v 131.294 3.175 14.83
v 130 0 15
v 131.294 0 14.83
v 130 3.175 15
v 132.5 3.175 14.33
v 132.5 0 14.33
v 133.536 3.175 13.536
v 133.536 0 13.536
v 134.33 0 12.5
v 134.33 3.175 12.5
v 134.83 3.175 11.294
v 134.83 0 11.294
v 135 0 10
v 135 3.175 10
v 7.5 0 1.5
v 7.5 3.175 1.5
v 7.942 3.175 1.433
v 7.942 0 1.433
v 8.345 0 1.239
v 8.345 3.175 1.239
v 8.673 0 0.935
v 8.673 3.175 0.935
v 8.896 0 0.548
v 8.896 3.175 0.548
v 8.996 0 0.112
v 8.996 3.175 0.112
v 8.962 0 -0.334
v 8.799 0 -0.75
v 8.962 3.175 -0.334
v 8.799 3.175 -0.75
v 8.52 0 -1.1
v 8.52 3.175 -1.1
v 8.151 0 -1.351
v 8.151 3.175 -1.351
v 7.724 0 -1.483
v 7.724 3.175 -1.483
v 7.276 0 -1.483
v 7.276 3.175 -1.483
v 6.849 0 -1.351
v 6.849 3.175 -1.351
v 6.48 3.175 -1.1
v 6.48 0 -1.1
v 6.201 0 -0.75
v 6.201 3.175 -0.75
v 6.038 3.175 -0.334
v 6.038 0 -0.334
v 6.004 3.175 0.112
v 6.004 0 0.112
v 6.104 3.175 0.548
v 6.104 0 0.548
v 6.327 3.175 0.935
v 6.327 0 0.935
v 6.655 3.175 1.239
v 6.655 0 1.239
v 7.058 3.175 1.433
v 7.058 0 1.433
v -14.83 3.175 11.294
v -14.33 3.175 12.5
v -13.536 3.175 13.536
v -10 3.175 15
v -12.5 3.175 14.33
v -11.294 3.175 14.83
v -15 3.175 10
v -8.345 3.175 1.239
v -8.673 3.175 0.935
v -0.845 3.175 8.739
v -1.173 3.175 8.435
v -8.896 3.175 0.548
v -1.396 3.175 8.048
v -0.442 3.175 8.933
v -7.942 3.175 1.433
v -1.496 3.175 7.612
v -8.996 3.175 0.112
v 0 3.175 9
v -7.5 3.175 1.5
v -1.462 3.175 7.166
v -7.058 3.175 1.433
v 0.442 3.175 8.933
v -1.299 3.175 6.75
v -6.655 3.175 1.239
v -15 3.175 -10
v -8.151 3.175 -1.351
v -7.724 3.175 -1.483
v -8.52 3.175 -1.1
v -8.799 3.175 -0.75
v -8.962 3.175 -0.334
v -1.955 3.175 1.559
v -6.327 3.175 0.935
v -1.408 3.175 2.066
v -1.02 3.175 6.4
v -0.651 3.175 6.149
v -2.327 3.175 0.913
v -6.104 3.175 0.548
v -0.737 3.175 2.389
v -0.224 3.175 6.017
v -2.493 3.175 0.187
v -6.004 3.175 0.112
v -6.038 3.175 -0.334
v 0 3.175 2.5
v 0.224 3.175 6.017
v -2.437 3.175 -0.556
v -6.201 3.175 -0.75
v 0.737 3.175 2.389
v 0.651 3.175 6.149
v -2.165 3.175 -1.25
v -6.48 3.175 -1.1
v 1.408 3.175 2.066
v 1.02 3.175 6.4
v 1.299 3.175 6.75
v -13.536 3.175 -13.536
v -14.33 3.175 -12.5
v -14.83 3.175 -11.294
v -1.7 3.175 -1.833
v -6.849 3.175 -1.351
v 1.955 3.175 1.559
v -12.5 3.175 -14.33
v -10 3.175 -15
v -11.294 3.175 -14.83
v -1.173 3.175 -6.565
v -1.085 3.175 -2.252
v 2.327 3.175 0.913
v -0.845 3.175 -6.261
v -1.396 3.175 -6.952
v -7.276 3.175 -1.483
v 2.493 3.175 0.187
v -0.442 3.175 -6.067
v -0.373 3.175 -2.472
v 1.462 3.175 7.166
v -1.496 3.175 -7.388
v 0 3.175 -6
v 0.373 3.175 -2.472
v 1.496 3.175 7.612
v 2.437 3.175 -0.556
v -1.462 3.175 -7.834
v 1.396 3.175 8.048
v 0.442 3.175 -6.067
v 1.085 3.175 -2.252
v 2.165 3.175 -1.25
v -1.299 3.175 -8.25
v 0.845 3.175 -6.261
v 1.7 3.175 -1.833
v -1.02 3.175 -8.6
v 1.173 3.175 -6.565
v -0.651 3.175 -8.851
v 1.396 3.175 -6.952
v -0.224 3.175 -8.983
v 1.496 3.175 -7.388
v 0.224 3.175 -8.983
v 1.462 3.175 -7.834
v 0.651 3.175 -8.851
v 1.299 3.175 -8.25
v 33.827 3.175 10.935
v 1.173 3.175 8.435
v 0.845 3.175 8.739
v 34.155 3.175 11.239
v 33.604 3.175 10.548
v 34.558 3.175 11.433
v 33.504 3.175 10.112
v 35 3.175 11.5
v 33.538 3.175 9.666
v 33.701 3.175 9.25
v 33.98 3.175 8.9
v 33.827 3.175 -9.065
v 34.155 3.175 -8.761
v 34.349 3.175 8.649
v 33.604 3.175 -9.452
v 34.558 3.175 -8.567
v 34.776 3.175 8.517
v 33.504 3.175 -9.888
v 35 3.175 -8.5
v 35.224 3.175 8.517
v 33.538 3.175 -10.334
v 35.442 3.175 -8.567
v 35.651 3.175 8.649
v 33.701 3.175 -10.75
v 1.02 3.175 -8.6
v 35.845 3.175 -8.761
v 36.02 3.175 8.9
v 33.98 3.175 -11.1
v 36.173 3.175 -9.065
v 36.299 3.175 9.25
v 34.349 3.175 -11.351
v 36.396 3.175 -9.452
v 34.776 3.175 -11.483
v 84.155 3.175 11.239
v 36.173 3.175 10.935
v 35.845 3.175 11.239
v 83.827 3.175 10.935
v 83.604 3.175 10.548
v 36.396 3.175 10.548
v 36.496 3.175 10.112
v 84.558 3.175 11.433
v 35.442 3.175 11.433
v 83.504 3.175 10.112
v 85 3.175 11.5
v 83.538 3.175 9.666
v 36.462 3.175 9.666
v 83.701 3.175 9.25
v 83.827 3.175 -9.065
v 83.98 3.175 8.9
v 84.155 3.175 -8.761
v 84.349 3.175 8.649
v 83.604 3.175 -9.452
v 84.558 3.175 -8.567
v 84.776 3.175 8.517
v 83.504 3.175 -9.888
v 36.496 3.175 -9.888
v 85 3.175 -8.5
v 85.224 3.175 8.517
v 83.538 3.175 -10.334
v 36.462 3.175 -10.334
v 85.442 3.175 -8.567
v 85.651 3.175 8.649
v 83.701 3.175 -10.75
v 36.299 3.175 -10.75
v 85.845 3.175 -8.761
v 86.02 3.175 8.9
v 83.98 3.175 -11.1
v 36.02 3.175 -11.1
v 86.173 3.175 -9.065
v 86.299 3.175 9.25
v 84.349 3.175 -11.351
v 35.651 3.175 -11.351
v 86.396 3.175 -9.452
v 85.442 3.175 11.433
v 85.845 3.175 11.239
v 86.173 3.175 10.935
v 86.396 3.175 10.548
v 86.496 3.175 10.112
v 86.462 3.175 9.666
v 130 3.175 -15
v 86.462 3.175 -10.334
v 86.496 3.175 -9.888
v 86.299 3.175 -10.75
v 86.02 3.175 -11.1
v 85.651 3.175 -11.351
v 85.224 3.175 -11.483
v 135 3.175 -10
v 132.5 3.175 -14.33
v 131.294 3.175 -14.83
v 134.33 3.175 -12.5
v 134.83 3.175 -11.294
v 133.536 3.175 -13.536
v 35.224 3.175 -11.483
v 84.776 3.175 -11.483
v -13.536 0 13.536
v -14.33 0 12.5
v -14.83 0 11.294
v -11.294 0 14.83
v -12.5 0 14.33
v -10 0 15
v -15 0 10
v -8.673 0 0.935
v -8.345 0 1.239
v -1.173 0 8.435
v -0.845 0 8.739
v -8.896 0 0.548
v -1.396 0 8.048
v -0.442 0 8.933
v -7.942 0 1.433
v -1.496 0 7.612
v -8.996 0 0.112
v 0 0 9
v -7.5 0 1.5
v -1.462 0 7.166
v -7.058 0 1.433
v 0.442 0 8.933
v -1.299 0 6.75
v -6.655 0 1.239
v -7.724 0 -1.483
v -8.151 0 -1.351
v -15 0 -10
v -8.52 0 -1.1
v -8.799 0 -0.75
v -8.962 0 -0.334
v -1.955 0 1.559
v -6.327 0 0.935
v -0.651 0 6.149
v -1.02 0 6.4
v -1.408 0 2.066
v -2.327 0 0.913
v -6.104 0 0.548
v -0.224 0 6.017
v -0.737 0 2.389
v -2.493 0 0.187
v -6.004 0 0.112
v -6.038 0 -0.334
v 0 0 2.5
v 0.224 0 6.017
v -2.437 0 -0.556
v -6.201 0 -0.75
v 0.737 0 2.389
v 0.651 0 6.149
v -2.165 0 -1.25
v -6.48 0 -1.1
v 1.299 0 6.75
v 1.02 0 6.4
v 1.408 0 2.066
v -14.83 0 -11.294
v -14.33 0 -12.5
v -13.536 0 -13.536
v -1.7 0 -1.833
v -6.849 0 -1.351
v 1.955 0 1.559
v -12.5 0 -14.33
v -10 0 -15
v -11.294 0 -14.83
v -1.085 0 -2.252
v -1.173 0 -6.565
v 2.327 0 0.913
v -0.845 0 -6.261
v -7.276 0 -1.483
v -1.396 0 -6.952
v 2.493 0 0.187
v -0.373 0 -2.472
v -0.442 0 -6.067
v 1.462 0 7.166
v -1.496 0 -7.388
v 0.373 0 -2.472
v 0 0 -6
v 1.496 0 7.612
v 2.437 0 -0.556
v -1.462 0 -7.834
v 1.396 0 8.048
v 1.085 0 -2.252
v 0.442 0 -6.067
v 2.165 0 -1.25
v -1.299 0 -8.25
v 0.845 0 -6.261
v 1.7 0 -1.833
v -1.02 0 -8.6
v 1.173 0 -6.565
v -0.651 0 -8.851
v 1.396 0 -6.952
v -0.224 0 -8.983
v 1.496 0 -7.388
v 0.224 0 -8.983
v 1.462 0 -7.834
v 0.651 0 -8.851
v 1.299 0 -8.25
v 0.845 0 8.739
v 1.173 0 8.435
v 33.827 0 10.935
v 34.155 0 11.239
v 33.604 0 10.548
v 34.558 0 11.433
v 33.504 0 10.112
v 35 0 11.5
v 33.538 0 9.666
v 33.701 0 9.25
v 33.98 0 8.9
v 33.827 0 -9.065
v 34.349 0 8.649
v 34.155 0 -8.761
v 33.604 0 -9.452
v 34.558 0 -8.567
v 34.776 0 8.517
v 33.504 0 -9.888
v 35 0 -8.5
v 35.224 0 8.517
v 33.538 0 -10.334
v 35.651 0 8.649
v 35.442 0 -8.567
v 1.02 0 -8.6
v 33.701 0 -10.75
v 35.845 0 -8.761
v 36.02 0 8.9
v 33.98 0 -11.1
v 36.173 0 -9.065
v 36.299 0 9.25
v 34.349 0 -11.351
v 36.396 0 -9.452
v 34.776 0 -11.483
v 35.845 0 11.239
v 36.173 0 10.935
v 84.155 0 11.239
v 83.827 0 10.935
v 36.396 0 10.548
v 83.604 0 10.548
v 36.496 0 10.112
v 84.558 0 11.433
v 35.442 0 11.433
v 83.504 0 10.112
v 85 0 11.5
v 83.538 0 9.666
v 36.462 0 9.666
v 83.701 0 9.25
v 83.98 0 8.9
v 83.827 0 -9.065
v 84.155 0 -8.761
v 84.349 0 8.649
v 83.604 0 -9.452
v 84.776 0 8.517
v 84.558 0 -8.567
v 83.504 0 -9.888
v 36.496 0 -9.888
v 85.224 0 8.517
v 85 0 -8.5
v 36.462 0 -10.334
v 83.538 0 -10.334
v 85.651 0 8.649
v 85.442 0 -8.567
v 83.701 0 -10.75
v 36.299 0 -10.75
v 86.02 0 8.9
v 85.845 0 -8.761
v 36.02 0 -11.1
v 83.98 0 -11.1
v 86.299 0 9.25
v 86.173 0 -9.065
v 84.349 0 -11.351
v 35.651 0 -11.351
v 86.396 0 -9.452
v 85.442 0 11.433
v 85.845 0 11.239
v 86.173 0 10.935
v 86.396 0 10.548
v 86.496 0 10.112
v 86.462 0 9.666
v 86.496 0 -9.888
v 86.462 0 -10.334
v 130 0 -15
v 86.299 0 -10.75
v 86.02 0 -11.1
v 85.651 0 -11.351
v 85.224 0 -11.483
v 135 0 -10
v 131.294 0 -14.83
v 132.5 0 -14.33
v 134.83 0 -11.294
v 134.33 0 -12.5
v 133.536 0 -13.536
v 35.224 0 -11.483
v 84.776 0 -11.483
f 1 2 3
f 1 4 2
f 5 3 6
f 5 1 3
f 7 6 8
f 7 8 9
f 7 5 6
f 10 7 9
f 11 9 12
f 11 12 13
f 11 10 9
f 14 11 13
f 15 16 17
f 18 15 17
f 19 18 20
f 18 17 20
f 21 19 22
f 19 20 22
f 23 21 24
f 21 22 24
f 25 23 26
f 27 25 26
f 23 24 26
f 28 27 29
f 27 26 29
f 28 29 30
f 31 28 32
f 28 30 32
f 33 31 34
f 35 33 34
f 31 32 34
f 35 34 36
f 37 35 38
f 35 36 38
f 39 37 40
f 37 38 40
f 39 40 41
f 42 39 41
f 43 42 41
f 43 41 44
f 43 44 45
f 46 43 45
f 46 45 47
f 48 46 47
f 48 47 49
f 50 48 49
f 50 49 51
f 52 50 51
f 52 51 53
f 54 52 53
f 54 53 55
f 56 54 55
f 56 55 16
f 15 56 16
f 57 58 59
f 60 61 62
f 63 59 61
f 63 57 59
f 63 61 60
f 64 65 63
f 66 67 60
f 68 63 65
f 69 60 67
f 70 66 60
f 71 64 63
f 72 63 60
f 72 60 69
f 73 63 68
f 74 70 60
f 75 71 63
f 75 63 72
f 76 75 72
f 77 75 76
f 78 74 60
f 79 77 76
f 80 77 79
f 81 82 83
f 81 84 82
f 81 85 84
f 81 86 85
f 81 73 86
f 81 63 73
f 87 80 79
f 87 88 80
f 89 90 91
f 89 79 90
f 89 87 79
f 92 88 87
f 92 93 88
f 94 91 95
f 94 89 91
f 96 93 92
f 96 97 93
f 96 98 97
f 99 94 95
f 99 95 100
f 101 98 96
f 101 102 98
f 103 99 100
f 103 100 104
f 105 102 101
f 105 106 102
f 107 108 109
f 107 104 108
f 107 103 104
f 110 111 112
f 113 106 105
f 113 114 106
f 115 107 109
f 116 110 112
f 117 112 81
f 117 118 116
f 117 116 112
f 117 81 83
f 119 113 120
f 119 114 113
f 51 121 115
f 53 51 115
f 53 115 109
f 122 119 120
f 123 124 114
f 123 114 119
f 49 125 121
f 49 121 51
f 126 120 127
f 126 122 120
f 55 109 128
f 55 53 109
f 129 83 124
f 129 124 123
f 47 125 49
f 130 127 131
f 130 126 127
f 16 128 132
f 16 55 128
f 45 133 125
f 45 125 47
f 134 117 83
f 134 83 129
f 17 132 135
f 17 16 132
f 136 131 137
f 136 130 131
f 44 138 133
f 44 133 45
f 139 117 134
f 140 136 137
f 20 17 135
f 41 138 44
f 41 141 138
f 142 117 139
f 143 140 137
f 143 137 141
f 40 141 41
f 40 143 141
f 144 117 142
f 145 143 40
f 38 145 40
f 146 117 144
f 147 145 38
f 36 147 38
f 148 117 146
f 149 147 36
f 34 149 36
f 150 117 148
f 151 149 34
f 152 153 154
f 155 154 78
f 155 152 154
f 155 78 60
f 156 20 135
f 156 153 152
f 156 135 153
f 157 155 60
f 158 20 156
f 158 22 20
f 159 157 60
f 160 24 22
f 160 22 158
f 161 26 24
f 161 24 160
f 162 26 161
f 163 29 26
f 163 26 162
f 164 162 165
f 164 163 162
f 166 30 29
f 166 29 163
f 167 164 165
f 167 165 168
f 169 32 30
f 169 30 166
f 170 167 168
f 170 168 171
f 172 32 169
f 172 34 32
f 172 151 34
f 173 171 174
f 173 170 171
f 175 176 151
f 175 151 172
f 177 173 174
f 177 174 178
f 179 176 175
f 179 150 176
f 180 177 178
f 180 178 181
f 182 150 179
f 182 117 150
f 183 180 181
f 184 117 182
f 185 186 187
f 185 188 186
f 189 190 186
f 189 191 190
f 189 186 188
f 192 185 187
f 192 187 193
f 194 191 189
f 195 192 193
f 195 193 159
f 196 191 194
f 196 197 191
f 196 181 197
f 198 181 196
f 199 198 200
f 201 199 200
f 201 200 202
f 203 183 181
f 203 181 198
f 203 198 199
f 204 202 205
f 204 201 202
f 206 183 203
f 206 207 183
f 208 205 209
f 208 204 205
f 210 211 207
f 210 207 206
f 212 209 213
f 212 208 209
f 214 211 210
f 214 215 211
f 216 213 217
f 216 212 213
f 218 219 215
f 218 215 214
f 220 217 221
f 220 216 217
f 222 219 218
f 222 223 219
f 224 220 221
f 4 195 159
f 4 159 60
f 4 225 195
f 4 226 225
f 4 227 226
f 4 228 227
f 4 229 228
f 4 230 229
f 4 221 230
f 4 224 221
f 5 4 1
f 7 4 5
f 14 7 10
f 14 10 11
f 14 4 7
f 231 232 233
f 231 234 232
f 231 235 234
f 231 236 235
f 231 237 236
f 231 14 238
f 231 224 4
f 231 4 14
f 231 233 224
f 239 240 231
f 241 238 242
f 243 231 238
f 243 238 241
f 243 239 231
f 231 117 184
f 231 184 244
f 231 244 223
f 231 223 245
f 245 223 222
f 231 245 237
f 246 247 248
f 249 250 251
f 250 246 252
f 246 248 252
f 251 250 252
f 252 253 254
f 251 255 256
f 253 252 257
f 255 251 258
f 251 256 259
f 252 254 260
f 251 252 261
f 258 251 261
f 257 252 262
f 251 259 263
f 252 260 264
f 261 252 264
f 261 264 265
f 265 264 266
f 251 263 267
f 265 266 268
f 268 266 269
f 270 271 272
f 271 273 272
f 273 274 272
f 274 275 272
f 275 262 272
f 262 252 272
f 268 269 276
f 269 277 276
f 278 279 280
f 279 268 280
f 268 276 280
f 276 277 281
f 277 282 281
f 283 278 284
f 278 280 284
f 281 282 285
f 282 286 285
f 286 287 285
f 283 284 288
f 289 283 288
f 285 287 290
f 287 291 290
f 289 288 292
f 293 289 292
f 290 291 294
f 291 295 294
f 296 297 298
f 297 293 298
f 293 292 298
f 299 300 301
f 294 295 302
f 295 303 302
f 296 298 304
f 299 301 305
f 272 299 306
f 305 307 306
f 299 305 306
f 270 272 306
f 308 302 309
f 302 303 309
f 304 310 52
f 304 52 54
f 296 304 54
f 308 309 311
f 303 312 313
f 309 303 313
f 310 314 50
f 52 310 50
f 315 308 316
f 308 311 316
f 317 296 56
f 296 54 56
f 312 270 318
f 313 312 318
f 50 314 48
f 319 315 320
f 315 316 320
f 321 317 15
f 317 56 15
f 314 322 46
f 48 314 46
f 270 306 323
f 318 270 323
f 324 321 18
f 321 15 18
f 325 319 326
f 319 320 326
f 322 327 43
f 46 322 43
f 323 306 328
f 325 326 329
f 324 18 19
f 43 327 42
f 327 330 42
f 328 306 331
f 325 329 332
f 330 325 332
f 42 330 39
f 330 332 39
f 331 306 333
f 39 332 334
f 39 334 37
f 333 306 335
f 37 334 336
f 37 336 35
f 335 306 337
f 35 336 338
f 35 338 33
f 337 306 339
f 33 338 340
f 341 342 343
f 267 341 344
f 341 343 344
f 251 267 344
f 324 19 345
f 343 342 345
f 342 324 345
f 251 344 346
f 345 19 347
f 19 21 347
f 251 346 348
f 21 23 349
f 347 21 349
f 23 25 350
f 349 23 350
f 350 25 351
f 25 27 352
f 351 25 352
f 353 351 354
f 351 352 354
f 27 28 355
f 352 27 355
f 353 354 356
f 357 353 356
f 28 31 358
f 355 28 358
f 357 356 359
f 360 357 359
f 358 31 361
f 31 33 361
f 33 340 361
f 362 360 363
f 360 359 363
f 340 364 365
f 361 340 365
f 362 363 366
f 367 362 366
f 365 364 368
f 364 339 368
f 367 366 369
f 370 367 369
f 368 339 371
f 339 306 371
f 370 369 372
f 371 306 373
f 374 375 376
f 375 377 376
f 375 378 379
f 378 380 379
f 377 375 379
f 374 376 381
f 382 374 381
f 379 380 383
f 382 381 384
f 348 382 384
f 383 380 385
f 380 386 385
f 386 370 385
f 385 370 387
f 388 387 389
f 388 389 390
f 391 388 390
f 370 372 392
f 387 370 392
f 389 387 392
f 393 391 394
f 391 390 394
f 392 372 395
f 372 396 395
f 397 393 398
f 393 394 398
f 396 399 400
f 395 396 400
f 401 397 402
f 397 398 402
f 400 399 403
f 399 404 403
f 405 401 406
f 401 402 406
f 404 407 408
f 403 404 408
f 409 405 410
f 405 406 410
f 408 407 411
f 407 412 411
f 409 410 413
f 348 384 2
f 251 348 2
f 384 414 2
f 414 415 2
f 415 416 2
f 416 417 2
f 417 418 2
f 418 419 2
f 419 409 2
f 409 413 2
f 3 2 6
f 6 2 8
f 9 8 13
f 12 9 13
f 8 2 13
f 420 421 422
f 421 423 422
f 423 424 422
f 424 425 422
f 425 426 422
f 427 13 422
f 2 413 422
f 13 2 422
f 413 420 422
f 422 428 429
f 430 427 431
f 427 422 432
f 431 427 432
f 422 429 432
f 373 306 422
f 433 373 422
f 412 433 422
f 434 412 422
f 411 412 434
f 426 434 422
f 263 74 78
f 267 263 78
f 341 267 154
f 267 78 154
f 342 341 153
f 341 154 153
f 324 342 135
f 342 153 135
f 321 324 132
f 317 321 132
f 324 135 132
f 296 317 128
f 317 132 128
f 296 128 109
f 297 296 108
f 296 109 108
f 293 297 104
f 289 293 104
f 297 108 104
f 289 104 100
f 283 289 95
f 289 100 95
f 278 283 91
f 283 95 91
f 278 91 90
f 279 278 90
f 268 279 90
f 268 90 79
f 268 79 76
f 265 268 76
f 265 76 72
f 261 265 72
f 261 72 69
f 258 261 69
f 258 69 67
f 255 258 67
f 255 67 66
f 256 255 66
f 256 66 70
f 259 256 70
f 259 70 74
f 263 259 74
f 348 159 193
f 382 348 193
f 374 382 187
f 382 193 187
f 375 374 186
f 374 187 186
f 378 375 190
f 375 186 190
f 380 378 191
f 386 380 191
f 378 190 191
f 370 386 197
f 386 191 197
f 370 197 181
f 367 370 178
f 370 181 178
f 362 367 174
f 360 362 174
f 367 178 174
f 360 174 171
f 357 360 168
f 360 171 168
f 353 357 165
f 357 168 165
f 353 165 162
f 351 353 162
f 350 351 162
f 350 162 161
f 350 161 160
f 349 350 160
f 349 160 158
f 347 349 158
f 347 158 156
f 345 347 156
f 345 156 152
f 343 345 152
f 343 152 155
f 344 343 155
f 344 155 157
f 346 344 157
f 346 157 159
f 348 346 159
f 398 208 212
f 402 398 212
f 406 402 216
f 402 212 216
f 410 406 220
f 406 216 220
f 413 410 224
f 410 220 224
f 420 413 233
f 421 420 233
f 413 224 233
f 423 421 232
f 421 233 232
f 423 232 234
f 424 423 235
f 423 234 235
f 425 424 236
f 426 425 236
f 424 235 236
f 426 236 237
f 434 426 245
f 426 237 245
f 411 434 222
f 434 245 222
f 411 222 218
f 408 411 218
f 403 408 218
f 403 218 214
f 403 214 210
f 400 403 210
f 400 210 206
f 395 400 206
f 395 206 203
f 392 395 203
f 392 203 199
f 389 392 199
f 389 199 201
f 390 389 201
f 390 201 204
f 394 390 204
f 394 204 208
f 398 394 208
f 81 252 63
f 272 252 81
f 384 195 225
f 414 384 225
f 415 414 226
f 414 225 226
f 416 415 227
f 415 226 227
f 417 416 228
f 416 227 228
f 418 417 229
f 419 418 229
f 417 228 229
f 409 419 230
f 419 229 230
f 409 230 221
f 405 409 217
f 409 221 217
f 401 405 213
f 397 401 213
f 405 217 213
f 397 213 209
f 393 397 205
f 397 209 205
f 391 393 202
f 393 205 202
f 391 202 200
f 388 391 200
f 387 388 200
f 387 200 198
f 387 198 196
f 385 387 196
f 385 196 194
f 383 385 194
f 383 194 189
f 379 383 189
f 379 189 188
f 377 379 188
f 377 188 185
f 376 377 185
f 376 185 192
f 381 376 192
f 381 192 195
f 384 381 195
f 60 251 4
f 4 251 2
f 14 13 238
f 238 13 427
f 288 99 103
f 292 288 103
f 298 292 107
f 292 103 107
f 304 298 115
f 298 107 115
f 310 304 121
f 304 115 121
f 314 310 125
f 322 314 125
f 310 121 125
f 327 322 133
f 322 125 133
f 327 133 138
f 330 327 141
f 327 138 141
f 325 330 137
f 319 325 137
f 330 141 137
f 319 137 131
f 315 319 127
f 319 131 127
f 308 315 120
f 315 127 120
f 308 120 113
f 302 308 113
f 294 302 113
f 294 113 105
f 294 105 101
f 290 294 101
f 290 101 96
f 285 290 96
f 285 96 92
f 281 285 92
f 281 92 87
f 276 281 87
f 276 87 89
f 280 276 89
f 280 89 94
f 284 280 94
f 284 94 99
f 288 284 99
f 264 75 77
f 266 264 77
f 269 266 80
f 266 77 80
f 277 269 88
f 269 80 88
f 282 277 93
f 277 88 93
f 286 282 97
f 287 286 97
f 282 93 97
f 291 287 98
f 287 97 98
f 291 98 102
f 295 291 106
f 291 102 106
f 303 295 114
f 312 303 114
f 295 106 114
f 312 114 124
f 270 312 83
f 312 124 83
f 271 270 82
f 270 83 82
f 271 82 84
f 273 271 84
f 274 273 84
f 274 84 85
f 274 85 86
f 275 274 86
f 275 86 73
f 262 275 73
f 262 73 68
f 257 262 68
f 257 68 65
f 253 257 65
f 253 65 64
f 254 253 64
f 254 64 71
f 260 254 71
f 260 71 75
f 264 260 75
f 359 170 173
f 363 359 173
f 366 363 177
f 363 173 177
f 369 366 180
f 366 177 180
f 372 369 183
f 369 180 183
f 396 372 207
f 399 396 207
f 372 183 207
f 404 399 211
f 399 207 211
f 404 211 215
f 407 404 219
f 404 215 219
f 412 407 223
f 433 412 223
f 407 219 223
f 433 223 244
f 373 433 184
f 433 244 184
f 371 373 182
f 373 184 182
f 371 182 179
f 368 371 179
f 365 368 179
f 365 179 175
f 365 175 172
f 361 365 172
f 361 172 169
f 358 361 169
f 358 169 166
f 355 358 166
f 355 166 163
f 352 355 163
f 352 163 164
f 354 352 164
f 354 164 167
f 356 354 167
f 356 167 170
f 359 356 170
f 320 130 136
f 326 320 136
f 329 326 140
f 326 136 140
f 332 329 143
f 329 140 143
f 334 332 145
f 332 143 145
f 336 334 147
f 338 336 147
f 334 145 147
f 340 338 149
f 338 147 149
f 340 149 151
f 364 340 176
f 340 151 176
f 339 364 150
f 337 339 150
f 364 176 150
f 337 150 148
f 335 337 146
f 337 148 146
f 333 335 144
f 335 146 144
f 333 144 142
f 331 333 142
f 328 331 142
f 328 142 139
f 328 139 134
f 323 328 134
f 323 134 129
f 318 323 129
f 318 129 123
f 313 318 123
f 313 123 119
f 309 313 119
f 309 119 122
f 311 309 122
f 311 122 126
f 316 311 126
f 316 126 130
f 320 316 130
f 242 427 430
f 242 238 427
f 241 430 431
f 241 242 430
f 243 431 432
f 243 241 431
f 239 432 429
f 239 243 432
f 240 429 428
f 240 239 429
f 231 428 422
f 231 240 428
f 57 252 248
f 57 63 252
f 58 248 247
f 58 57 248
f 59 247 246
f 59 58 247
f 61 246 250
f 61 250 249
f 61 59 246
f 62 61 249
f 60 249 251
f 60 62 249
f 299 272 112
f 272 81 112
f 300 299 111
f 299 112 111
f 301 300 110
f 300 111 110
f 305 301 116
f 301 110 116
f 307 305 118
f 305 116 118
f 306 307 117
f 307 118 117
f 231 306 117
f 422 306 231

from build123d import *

# Parameters (mm, degrees)
SKETCH1_W           = 150
SKETCH1_H           = 30
BOSS_EXTRUDE1_DEPTH = 3.175
FILLET1_R           = 5
SKETCH2_R           = 2.5
CUT_EXTRUDE1_DEPTH  = 136.867879298
SKETCH3_R           = 1.5
CUT_EXTRUDE3_DEPTH  = 136.867879298
SKETCH4_R           = 1.5
CUT_EXTRUDE4_DEPTH  = 10


with BuildPart() as part:
    # Sketch1 → Boss-Extrude1 (new body)
    with BuildSketch(Plane(origin=(0, 0, 0), x_dir=(1, 0, 0), z_dir=(0, 1, 0))):
        with Locations((60, 0)):
            Rectangle(SKETCH1_W, SKETCH1_H)
    extrude(amount=BOSS_EXTRUDE1_DEPTH)

    # Fillet1
    fillet1_edges = [part.edges().sort_by_distance(p)[0] for p in [
        (-15, 1.5875, -15),
        (135, 1.5875, -15),
        (135, 1.5875, 15),
        (-15, 1.5875, 15),
    ]]
    fillet(fillet1_edges, radius=FILLET1_R)

    # Sketch2 → Cut-Extrude1 (cut, through all)
    with BuildSketch(Plane(origin=(0, 3.175, 0), x_dir=(1, 0, 0), z_dir=(0, 1, 0))):
        with Locations(Location((0, 0, 0), (0, 0, 270))):
            Circle(SKETCH2_R)
    extrude(amount=-CUT_EXTRUDE1_DEPTH, mode=Mode.SUBTRACT)

    # Sketch3 → Cut-Extrude3 (cut, through all)
    with BuildSketch(Plane(origin=(0, 3.175, 0), x_dir=(1, 0, 0), z_dir=(0, 1, 0))):
        with Locations(Location((7.5, 0, 0), (0, 0, 270))):
            Circle(SKETCH3_R)
        with Locations(Location((0, -7.5, 0), (0, 0, 270))):
            Circle(SKETCH3_R)
        with Locations(Location((-7.5, 0, 0), (0, 0, 270))):
            Circle(SKETCH3_R)
        with Locations(Location((0, 7.5, 0), (0, 0, 270))):
            Circle(SKETCH3_R)
    extrude(amount=-CUT_EXTRUDE3_DEPTH, mode=Mode.SUBTRACT)

    # Sketch4 → Cut-Extrude4 (cut)
    with BuildSketch(Plane(origin=(0, 3.175, 0), x_dir=(1, 0, 0), z_dir=(0, 1, 0))):
        with Locations(Location((35, -10, 0), (0, 0, 270))):
            Circle(SKETCH4_R)
        with Locations(Location((85, -10, 0), (0, 0, 270))):
            Circle(SKETCH4_R)
        with Locations(Location((85, 10, 0), (0, 0, 270))):
            Circle(SKETCH4_R)
        with Locations(Location((35, 10, 0), (0, 0, 270))):
            Circle(SKETCH4_R)
    extrude(amount=-CUT_EXTRUDE4_DEPTH, mode=Mode.SUBTRACT)


solid = part.part
